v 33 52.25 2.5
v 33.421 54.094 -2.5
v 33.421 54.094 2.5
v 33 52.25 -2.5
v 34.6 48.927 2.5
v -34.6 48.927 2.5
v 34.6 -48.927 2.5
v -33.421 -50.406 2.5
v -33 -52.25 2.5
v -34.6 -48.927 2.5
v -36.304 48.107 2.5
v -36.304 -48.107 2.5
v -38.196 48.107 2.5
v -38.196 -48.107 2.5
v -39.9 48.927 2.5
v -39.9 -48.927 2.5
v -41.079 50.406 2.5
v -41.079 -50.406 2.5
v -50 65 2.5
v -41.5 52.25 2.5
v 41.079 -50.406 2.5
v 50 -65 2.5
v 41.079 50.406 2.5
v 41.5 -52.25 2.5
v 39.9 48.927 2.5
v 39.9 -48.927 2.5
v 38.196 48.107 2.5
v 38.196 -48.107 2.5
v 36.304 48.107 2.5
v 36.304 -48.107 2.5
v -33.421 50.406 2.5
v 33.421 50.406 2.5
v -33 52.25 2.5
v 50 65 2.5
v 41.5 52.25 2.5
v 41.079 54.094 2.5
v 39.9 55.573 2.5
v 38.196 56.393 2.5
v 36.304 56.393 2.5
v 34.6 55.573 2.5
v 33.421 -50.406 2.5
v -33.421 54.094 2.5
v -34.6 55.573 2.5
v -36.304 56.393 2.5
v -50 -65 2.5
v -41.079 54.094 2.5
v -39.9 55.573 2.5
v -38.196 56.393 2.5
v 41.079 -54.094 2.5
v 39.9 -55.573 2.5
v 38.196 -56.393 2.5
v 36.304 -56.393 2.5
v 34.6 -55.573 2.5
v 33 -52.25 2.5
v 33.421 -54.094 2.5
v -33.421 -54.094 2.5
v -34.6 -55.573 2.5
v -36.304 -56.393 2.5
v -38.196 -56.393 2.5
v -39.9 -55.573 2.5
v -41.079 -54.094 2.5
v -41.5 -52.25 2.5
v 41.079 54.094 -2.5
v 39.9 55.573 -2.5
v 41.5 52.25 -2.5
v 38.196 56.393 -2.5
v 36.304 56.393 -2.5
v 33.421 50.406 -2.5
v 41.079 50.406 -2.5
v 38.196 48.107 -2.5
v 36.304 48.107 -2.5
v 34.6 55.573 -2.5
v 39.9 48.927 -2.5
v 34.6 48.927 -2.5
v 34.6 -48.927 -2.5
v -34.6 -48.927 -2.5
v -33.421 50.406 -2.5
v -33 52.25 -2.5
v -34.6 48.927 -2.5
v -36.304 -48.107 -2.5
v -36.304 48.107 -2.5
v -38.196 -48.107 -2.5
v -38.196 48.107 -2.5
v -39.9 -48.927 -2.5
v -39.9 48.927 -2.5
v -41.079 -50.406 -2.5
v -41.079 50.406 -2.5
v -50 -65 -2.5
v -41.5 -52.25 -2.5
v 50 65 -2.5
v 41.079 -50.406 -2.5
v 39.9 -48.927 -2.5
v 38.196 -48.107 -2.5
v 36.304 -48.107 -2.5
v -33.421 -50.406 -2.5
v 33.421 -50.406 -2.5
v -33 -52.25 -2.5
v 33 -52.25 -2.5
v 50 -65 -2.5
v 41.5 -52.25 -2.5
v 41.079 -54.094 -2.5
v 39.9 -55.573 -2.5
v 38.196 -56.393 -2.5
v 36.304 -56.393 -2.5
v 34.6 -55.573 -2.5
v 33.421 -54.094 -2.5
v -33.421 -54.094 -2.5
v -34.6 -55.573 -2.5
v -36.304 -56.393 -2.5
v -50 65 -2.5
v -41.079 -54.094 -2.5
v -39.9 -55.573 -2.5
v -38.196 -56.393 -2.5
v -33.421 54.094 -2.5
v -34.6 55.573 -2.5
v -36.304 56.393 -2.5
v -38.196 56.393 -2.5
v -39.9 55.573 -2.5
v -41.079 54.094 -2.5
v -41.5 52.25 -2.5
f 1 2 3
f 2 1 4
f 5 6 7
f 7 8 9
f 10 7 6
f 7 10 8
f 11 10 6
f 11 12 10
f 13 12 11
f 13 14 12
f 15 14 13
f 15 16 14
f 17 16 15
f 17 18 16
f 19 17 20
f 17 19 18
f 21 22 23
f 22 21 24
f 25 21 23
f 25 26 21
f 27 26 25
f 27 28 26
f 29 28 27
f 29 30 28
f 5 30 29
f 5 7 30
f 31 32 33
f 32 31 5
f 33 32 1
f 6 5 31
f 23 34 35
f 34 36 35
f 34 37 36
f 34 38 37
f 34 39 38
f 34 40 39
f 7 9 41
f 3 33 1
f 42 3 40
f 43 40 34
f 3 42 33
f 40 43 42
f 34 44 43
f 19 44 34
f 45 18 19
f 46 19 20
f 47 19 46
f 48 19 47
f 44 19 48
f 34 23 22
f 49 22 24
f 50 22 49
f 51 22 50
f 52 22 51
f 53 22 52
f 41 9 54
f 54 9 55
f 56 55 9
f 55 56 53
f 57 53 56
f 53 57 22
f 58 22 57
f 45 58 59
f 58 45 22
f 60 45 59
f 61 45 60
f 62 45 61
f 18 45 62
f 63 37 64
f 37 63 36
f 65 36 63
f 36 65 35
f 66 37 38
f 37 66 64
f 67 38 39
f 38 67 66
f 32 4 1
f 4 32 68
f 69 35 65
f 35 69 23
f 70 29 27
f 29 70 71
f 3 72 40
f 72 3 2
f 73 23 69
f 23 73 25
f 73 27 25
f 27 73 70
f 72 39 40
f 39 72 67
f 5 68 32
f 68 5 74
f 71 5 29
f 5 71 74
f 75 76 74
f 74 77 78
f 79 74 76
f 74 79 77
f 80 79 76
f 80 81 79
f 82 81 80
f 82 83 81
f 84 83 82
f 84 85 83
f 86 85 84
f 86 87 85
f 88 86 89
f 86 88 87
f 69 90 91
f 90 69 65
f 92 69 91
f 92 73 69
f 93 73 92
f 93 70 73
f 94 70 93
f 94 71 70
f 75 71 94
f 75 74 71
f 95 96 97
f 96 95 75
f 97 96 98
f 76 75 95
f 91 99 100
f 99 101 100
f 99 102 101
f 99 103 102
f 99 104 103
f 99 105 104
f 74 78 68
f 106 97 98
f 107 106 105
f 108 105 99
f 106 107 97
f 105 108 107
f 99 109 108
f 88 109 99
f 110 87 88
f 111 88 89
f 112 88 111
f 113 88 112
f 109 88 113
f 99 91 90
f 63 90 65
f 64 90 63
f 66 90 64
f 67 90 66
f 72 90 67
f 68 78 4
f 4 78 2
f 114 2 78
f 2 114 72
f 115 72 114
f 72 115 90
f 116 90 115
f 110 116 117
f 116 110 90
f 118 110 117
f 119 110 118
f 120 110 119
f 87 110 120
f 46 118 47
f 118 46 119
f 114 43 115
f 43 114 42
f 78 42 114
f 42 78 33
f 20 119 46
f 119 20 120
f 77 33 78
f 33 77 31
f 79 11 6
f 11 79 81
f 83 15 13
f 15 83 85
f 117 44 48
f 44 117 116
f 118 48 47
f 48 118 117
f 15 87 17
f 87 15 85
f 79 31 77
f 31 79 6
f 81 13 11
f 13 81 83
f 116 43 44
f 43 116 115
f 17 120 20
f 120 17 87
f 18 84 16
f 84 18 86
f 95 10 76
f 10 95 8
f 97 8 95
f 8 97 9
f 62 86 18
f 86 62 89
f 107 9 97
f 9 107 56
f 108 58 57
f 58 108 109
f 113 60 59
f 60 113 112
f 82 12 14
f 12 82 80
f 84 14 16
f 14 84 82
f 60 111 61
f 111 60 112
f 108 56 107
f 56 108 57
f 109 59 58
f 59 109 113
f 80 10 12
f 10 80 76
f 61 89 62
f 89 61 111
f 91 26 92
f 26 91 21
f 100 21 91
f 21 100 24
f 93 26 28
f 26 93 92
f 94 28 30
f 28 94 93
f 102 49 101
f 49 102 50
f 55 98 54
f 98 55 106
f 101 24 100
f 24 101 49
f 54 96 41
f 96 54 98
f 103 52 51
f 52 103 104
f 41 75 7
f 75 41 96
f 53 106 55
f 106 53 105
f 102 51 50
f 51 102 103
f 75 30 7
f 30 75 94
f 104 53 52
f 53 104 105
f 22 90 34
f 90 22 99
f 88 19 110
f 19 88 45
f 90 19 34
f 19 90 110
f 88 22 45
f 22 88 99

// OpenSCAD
// Generated by SolidPython 1.1.3 on 2023-11-26 20:41:07


difference() {
	cube(center = true, size = [100, 130.0000000000, 5]);
	union() {
		translate(v = [37.2500000000, 52.2500000000]) {
			cylinder(center = true, h = 5, r = 4.2500000000);
		}
		translate(v = [-37.2500000000, 52.2500000000]) {
			cylinder(center = true, h = 5, r = 4.2500000000);
		}
		translate(v = [-37.2500000000, -52.2500000000]) {
			cylinder(center = true, h = 5, r = 4.2500000000);
		}
		translate(v = [37.2500000000, -52.2500000000]) {
			cylinder(center = true, h = 5, r = 4.2500000000);
		}
	}
}
/***********************************************
*********      SolidPython code:      **********
************************************************
 
import solid
import numbers
import pudb
from solid.utils import *
import viewscad
import subprocess
import os
import os.path as osp
import math
import sys

chamfer_extrude=solid.import_scad("./chamfer_extrude.scad")
chamfer_extrude=chamfer_extrude.chamfer_extrude
r = viewscad.Renderer(width=800, height=800)

def debug(model,f_name,path="/home/ts/code/projects/mfd/designs/debug"):
    solid.scad_render_to_file(model,osp.join(path,f_name)+".scad")
#generate position list of wells using offset from center
wells_pos_from_center_4 = lambda offset: [[-offset,offset],
                                        [offset, offset],
                                        [-offset, -offset],
                                        [offset, -offset]]
#wells_pos_from_center_2 = lambda offset: [[0,offset],
#                                        [0, -offset]]
wells_pos_from_center_2 = lambda offset: [[offset,0],
                                        [-offset,0]]

def make_well(dims,shape=None,height=None,dxf=False):
    def circle_cylinder():
        if dxf or (height is None):
            well = solid.circle(r=dims, segments=64)
        else:
            well = solid.cylinder(r=dims, h=height, segments=64, center = True)
        return well
    if dims is None:
        sys.exit("radius needs to be a number")
    if isinstance(dims, numbers.Number):
        well =circle_cylinder()
    elif len(dims)==1:
        if isinstance(dims[1], numbers.Number):
            well =circle_cylinder()
        else:
            sys.exit("radius needs to be a number")
    elif len(dims)==2:
        well = solid.square(dims,center = True)
    elif len(dims)==3:
        well = solid.cube(dims, center = True)
    return well

def wells_top_bottom(center_gap,device_dims=None,shape=None,height=None, positions = None, dxf = False,well_shape=None):
    if well_shape == None:
        well_shape = make_well(device_dims,shape=shape,height=height,dxf=dxf)
    wells = []
    if positions is None:
        offset = radius+radius/2.0
        positions = wells_pos_from_center_2(offset)
    if dxf or (height is None):
        height = 0
    for position in positions:
        if dxf:
            wells.append(solid.translate([position[0],position[1]])(well_shape))
        else:
            wells.append(solid.translate([position[0],position[1],height/2.0])(well_shape))
    return  union()(*wells)

#place wells in four corners 
def four_corner(radius,height=None, positions = None, dxf = False):
    #if well pos not specified set
    #to equally spaced by half radius
    if positions is None:
        offset = radius+radius/2.0
        positions = wells_pos_from_center_4(offset)
    if dxf or (height is None):
        height = 0
    #make wells at positions with specified radius and height
    wells = []
    for position in positions:
        #make circle if making dxf
        if dxf:
            well_shape = solid.circle(r=radius, segments=64)
            well_shape = solid.translate([position[0],position[1]])(well_shape)
        #if stl make cylinder
        else:
            well_shape = solid.cylinder(r=radius, h=height, segments=64, center = True)
            well_shape = solid.translate([position[0],position[1],height/2.0])(well_shape)
        wells.append(well_shape)
    return  union()(*wells)

#generate channels 
def make_channels(length,width,height=0,num_chans=1,max_chans=None,spacing=None, dxf = False,
                  rotate_channels=False):
    if dxf or (height is None):
        height = 0
    #if channel gap not defined, is equal to
    if spacing is None: spacing = width
    #calculate number of channels if fitting max num within given width
    if not max_chans is None:
        import math
        num_chans = math.floor((max_chans-spacing)/(width+spacing))
    #get total width of channel section  
    total_width = (width*num_chans)+(spacing*(num_chans-1))

    #make template channel
    #if rotate_channels: width, length = length, width
    if dxf:
        channel_t = solid.square([length,width],center = True)
    else:
        channel_t = solid.cube([length,width,height], center = True)

    #if number channels is even, offset the first channel to center its gap
    if num_chans % 2 == 0: centering = -(width/2.0+spacing/2.0)
    else: centering = 0
    #move template channel up to align bottom at z = 0 
    #and offset center if necessary
    if dxf:
        channel_t = solid.translate([0,centering])(channel_t)
    else:
        channel_t = solid.translate([0,centering,height/2.0])(channel_t)

    #if rotate_channels: length,width = width,length
    #start making the channels
    channels = []
    for i in range(num_chans):
        #if i=0 there is no translation
        #if i=1, we make the first channel adjacent to second
        direction = i

        #if i>=1, we add channels alternating left and right
        if i >= 1:
            direction = -(i/2.0)
            if i % 2 == 1: direction = (-direction)+0.5
                
        #make channel at right position and add it to channel list
        translation_coords = [0,direction*(width+spacing)]
        #if rotate_channels: translation_coords = [direction*(width+spacing),0]
        if dxf:
            channel = solid.translate(translation_coords)(channel_t)
        else:
            channel = solid.translate([*translation_coords,0])(channel_t)
        channels.append(channel)
    
    #group all channels as one object
    channels = union()(*channels)
    #compute the x,y,z dimensions in order to pass as arguments 
    #for construction of other parts of device (such as the chambers)
    measurements = {'x':(length/2.0,-length/2.0),
                    'y':(total_width/2.0,-total_width/2.0)}
    if not dxf:
        measurements['z'] = (height,0)
    if rotate_channels:
        channels = solid.rotate(90)(channels)
        measurements['x'],measurements['y']=measurements['y'],measurements['x']
    return channels,measurements

def make_chambers(msrs,height=None,extra=0,len_until=None,width=None, dxf = False):
    #computes x,y,z length
    total = lambda x : abs(x[0]) + abs(x[1])
    
    #if specific height if specified
    #otherwise use same height as channels
    if dxf:
        pass
    elif not height is None:
        msrs['z'] = (height,0)
    else:
        msrs['z'] = (0,0)
        
    #make copy of measurements from channels to modify chamber dimensions 
    #and add length to chambers as specified
    chamber_dims = msrs.copy()
    #calculate length of chamber to reach specified offset
    if not len_until is None:
        chamber_len = len_until-(msrs['x'][0])
    #or add specified length to channel length (if not specified, adds 0)
    else:
        chamber_len = msrs['x'][0]+extra
    #set the chamber length based 
    chamber_dims['x'] = (chamber_len/2.0,-(chamber_len/2.0))
    #compute final dimensions of chamber
    if not width is None:
        chamber_dims['y'] = (width/2.0,-width/2.0)
    chamber_dims = [total(size) for size in chamber_dims.values()]
        
    #calculate chamber translation offset to place adjacent to channels
    chamber_trslt = msrs['x'][0]+(chamber_len/2.0)
    #compute chamber translation coordinates to align with channels
    #x = 1 moves chamber above channels
    #x = -1 moves chamber below channels
    if dxf:
        trslt = lambda x : [x*(chamber_trslt),0]
    else:
        trslt = lambda x : [x*(chamber_trslt),0,msrs['z'][0]/2.0]
    
    #function to make chamber at top or at bottom 
    if dxf:
        move = lambda x : solid.translate(trslt(x))(solid.square(chamber_dims, center = True) )
    else:
        move = lambda x : solid.translate(trslt(x))(solid.cube(chamber_dims,center = True))
    #make top and bottom chambers and return them as grouped
    top = move(1)
    bottom = move(-1)
    #chambers=solid.rotate(90)(solid.union()(top,bottom))
    chambers=(solid.union()(top,bottom))

    return chambers

#create alignment features 
def alignment_features(unit,dims,grid_size, mask_size = None, alignment = "hollow", units_from_center = (2.5,2.5), corner_len=None):
    width = grid_size[0]*dims[0]
    length = grid_size[1]*dims[1]
    if mask_size is None and corner_len is None:
        corner_len = (dims[0] + dims[1]) /2 / 8
    corner = lambda thickness_div : solid.union()( solid.square([corner_len,corner_len/thickness_div],center=False), solid.square([corner_len/thickness_div,corner_len],center=False) )
    
    def make_full(thickness_div):
        thickness = corner_len/thickness_div
        tr = solid.translate([0, 0, 0 ])(solid.rotate(180)(corner(thickness_div)))
        tr = solid.translate([thickness/2,thickness/2,0])(tr)
        bl = solid.translate([0, 0, 0 ])(solid.rotate(0)(corner(thickness_div)))
        bl = solid.translate([-thickness/2,-thickness/2,0])(bl)
        return solid.union()(tr,bl)
    
    def make_hollow(thickness_div):
        thickness = corner_len/(thickness_div/2)
        inner = make_full(thickness_div)
        outer = make_full(thickness_div/2)
        hollow = outer - inner 
        return hollow
    
    center = (width /2 , length/2)
    mask_pos = lambda x,y : (center[0] + x*(float(units_from_center[0])*dims[0]), center[1] + y*(float(units_from_center[1])*dims[1]))
    positions = []
    positions.append(mask_pos(1,0))
    positions.append(mask_pos(0,1))
    positions.append(mask_pos(-1,0))
    positions.append(mask_pos(0,-1))
    make_mask = lambda mtype : make_hollow(8) if mtype == "hollow" else make_full(8)
    masks = [ solid.translate([*position,0])(make_mask(alignment)) for position in positions]
    
    solid.scad_render_to_file(solid.union()(*masks),"./designs/open_chamber/masks.scad")
    #return unit - solid.union()(*masks)
    return solid.union()(*masks,unit)

def create_outline(thickness, array, dims, grid_size,):
    width = grid_size[0]*dims[0] + thickness *2
    length = grid_size[1]*dims[1] + thickness *2
    outer = solid.translate([-thickness, -thickness,0])(solid.square([width, length]))
    return outer-array

def create_wall(wall_thickness, outline_thickness, dims, grid_size, wall_height = 2000, dxf = False):
    inner_width = grid_size[0]*dims[0] + outline_thickness *2
    inner_length = grid_size[1]*dims[1] + outline_thickness *2
    outer_width = inner_width + wall_thickness * 2
    outer_length = inner_length + wall_thickness * 2
    outer_pos_x = -outline_thickness-wall_thickness
    outer_pos_y = -outline_thickness-wall_thickness
    inner_pos_x = -outline_thickness
    inner_pos_y = -outline_thickness
    if dxf:
        inner_wall = solid.translate([inner_pos_x,
                                      inner_pos_y,
                                      0])(solid.square([inner_width, inner_length]))
        outer_wall = solid.translate([outer_pos_x,
                                      outer_pos_y,
                                      0])(solid.square([outer_width, outer_length]))

        return outer_wall-inner_wall
    else:
        inner_wall = solid.translate([inner_pos_x,
                                      inner_pos_y,
                                      0])(solid.cube([inner_width, inner_length,wall_height]))
        outer_wall = solid.translate([outer_pos_x,
                                      outer_pos_y,
                                      0])(solid.cube([outer_width, outer_length,wall_height]))

        return outer_wall-inner_wall, {'wall_height': wall_height,
                                       'wall_thickness': wall_thickness,
                                       'inner_width':inner_width,
                                       'inner_length': inner_length,
                                       'outer_width': outer_width,
                                       'outer_length': outer_length,
                                       'outer_pos_x' : outer_pos_x,
                                       'outer_pos_y' : outer_pos_y,
                                       'inner_pos_x' : inner_pos_x,
                                       'inner_pos_y' : inner_pos_y}

def create_thicker_wall(wall_thickness, outer_wall_offset, wall_dims, dims, grid_size, height_start = .2, height_end=2, dxf = False):
    addon_wall,thicker_wall_dims = create_wall(wall_thickness, outer_wall_offset, dims, grid_size, wall_height=height_end-height_start, dxf = False)
    addon_wall = solid.translate([0,0,height_start])(addon_wall)

    thicker_wall_dims['wall_height'] = height_end
    thicker_wall_dims['wall_thickness'] = wall_dims['wall_thickness'] + wall_thickness
    return addon_wall, thicker_wall_dims
 
def add_lock_to_wall(wall,wall_dims,y_offset = 0,cut_ratio=0.7,L_length=3, gap_ratio=0.05, axis="x",width_ratio=1/2):
    # Makes L shape
    def make_L(max_length,length_thickness,max_width,width_thickness,height,y_offset):
        length = solid.cube([max_length,length_thickness,height])
        width = solid.cube([width_thickness,max_width,height])
        width = solid.translate([max_length-(width_thickness),0,0])(width)
        L = solid.union()(width,length)
        debug(L,"L")
        if axis == "x":
            L = solid.rotate(-90)(L)
            L = solid.translate([0,max_length,0])(L)
        else:
            L = solid.rotate(-180)(L)
            L = solid.translate([max_length,max_width,0])(L)
        return solid.translate([0,0,y_offset])(L)
    
    lock_length = L_length
    lock_width = wall_dims['wall_thickness']*width_ratio
    lock_length_thickness = lock_width/2
    lock_width_thickness = lock_width/2
    L_lock = make_L(lock_length,lock_length_thickness,lock_width,lock_width_thickness, wall_dims['wall_height']-y_offset, y_offset)
    
    margin_space = lock_length - lock_length*(1-gap_ratio)
    key_length = lock_length-margin_space
    key_length_thickness = lock_length_thickness-(margin_space*2)
    key_width = lock_width-(margin_space*2)
    key_width_thickness = lock_width_thickness-(margin_space*2)
    L_key = make_L(key_length,key_length_thickness,key_width,key_width_thickness, wall_dims['wall_height']-y_offset, y_offset)
    L_key = solid.translate([margin_space,margin_space,0])(L_key)
    L = solid.union()(L_lock,L_key)
    debug(L,"L")
    
    #Make cube to be used as negative to split frame in a half
    #Can choose if making left or right negative, specify ratio of split
    def make_negative(right,cut_ratio):
        if axis == "x":
            if right:
                length = wall_dims['outer_length']*(1-cut_ratio)
                pos_x = wall_dims['outer_pos_x']+(wall_dims['outer_length']*cut_ratio)
            else:
                length = wall_dims['outer_length']*(cut_ratio)
                pos_x = wall_dims['outer_pos_x'] 
            negative = solid.cube([wall_dims['outer_width'],length, wall_dims['wall_height']])
            negative = solid.translate([wall_dims['outer_pos_y'],pos_x,0])(negative)
        else:
            if right:
                length = wall_dims['outer_width']*(1-cut_ratio)
                pos_x = wall_dims['outer_pos_y']+(wall_dims['outer_width']*cut_ratio)
            else:
                length = wall_dims['outer_width']*(cut_ratio)
                pos_x = wall_dims['outer_pos_y'] 
            negative = solid.cube([length,wall_dims['outer_length'], wall_dims['wall_height']])
            negative = solid.translate([pos_x,wall_dims['outer_pos_x'],0])(negative)
        return negative, pos_x, length 
                      
    #Make negatives
    negative_right, right_half_pos_x, right_half_length = make_negative(True,cut_ratio)
    negative_left, left_half_pos_x, right_half_length = make_negative(False,cut_ratio)
    #Make halves
    left_half = solid.difference()(wall,negative_right)
    right_half = solid.difference()(wall,negative_left)
    def place_L(L, L_length,L_width):
        #Place L on top wall       
        offset_to_center = (wall_dims['wall_thickness']-L_width)/2
        if axis == "x":
            y_pos_top = (wall_dims['outer_pos_y'] +
                    wall_dims['outer_width'] - 
                    L_width - offset_to_center)
            top_L = solid.translate([y_pos_top,
                                     right_half_pos_x-(L_length),
                                     0])(L)
            #Place L on bottom wall       
            y_pos_bottom = wall_dims['outer_pos_y']+offset_to_center
            bottom_L = solid.translate([y_pos_bottom,
                                        right_half_pos_x-L_length,
                                        0])(L)
        else:
            y_pos_top = (wall_dims['outer_pos_x'] +
                    wall_dims['outer_length'] -
                    (L_width+offset_to_center))
            top_L = solid.translate([right_half_pos_x-L_length,
                                     y_pos_top,
                                     0])(L)
            #Place L on bottom wall       
            y_pos_bottom = wall_dims['outer_pos_y']+offset_to_center
            bottom_L = solid.translate([right_half_pos_x-L_length,
                                        y_pos_bottom,
                                        0])(L)
        return bottom_L, top_L
    #Make complimentary L pieces through union and differences
    #Make Lock
    bottom_L_lock, top_L_lock = place_L(L_lock,L_length,lock_width)
    left_half = solid.difference()(left_half,bottom_L_lock)
    left_half = solid.difference()(left_half,top_L_lock)
    #Make Key
    bottom_L_key, top_L_key = place_L(L_key,L_length,lock_width)
    right_half = solid.union()(right_half,bottom_L_key)
    right_half = solid.union()(right_half,top_L_key)
    return left_half, right_half


#build a row x col grid of containment units
def make_unit_array(unit,dims,grid_size, dxf = False, alignment = None, mask_size = None,
                    units_from_center = None,alignment_offset=None, alignment_mark_size=1):
    units = []
    for col in range(grid_size[1]):
        for row in range(grid_size[0]):
            if dxf:
                units.append(solid.translate([row*dims[0],col*dims[1]])(unit))
            else:
                units.append(solid.translate([row*dims[0],col*dims[1],dims[2]/2.0])(unit))
    array = solid.union()(*units)
    if (not alignment is None) and dxf:
        if not alignment_offset is None:
            array = solid.translate([alignment_offset[0],alignment_offset[1]])(array)
        array = alignment_features(array,dims, grid_size, alignment = alignment, mask_size = None, units_from_center = units_from_center,corner_len=alignment_mark_size)
        if not alignment_offset is None:
            array = solid.translate([-alignment_offset[0],-alignment_offset[1]])(array)
    return array


def make_taylor(wells_pos = wells_pos_from_center_4(2.25), well_rad = 1.5 ,
                well_height = 2, chan_w = 0.01, chan_l = 1, chan_h = 0.010 ,
                chan_gap = 0.040, max_chans = None,num_chans=100, chamber_height  = 0.100,
                columns = 1, rows = 1, chamber_len_until=2.25, add_channels = True, add_wells = True, 
                add_chambers = True, save_path = "./", alignment = None, units_from_center = 2,
                mask_size = None, render_stl = False, outline_thickness = 0.050, dxf = True,
                wall_height = 15, wall_thickness = 0.95, casing_x=9, casing_y=9, casing_z=0,rotate_units=0):

    dims = [casing_x, casing_y, casing_z]
    wells = four_corner(well_rad,well_height, dxf = dxf, positions = wells_pos)
    debug(wells,"wells")
    channels, msrs = make_channels(chan_l,chan_w,chan_h,dxf=dxf, spacing = chan_gap, max_chans=max_chans,num_chans=num_chans)
    debug(channels,"channels")
    chambers = make_chambers(msrs,dxf = dxf, height=chamber_height,len_until=chamber_len_until)
    debug(chambers,"chambers")

    #add together and render
    device_parts = []
    if add_channels:
        device_parts.append(channels)
    if add_wells:
        device_parts.append(wells)
    if add_chambers:
        device_parts.append(chambers)
    device=union()(*device_parts)
    device = rotate(rotate_units)(device)

    device=solid.translate([dims[0]/2.0,dims[1]/2.0,0])(device)
    channels = rotate(rotate_units)(channels)
    channels=solid.translate([dims[0]/2,dims[1]/2,0])(channels)
    chambers_wells = union()(wells,chambers)
    chambers_wells = rotate(rotate_units)(chambers_wells)
    chambers_wells=solid.translate([dims[0]/2,dims[1]/2,0])(chambers_wells)

    file_name = str(rows)+'x'+str(columns)+'_units_'
    grid_size = [rows,columns]

    if alignment:
        alignment="full"
    device = make_unit_array(device,dims,grid_size, dxf=dxf, alignment = alignment,
                                 units_from_center = units_from_center)
    channels = make_unit_array(channels,dims,grid_size, dxf=dxf, alignment = alignment,
                                 units_from_center = units_from_center)
    if alignment=="full":
        alignment="hollow"

    chambers_wells = make_unit_array(chambers_wells,dims,grid_size, dxf=dxf, alignment = alignment,
                                 units_from_center =units_from_center)

    def save_model(model,prefix):
        model_fname = os.path.abspath(save_path+prefix+"_"+file_name+".scad")
        solid.scad_render_to_file(model,model_fname)
        return model_fname

    wells_fname = save_model(wells,"wells")
    channels_fname = save_model(channels,"channels")
    device_fname = save_model(device,"device")
    chambers_wells_fname = save_model(chambers_wells,"chambers_wells")
    return (chambers_wells,chambers_wells_fname), (channels,channels_fname), (device,device_fname)

def make_device(design='open',rows=8,columns=6,wells_pos = 4.5,well_offset=3.2, well_rad=3.2,well_height=0.1,
                chan_l=1,chan_w=0.01,chan_h=0.01,chan_gap=0.015,num_chans=101,dxf=True,save_path="./designs/open_chamber/",
                casing_x=9.0,casing_y=18.0,casing_z=0,rotate_units=90,units_from_center=(3,1),chamber_len_until=4.5,
                chamber_width=None,alignment=True, add_wells=True, add_channels=True,add_chambers=True,well_shape=None):

    dims = [casing_x, casing_y, casing_z]
    if design == "open":
        wells_pos=wells_pos_from_center_2(wells_pos)
        wells = wells_top_bottom(well_offset*2,device_dims=well_rad,height=well_height, dxf = dxf, positions = wells_pos,well_shape=well_shape)
    elif design == "closed":
        wells_pos=wells_pos_from_center_4(wells_pos)
        debug(wells,"wells")
        wells = four_corner(well_offset,well_height,device_dims=well_rad, dxf = dxf, positions = wells_pos)
    else:
        print(design+" is not a valid design.\n Choose valid design: 'open' or 'closed'")
        exit()
    wells = rotate(rotate_units)(wells)
    wells=solid.translate([dims[0]/2,dims[1]/2,0])(wells)
    debug(wells,"wells")

    channels, msrs = make_channels(chan_l,chan_w,chan_h,dxf=dxf, spacing = chan_gap, num_chans=num_chans,rotate_channels=False)
    channels = rotate(rotate_units)(channels)
    channels=solid.translate([dims[0]/2,dims[1]/2,0])(channels)

    chambers=make_chambers(msrs,height=None,extra=0,len_until=chamber_len_until, width=chamber_width,dxf = dxf)
    chambers = rotate(rotate_units)(chambers)
    chambers=solid.translate([dims[0]/2,dims[1]/2,0])(chambers)

    device_parts = []
    if add_channels:
        device_parts.append(channels)
    if add_wells:
        device_parts.append(wells)
    if add_chambers:
        device_parts.append(chambers)
    device = union()(*device_parts)
    #device = rotate(rotate_units)(device)
    #device=solid.translate([dims[0]/2.0,dims[1]/2.0,0])(device)

    chambers_wells = []
    if add_chambers:
        chambers_wells.append(chambers)
    if add_wells:
        chambers_wells.append(wells)
    chambers_wells = union()(*chambers_wells)
    #chambers_wells = union()(wells,chambers)
    #chambers_wells = rotate(rotate_units)(chambers_wells)
    #chambers_wells=solid.translate([dims[0]/2,dims[1]/2,0])(chambers_wells)

    file_name = str(rows)+'x'+str(columns)+'_units_'

    grid_size = [rows,columns]
    if alignment:
        alignment="full"
    device = make_unit_array(device,dims,grid_size, dxf=dxf, alignment = alignment,
                                 units_from_center = units_from_center)
    channels = make_unit_array(channels,dims,grid_size, dxf=dxf, alignment = alignment,
                                 units_from_center = units_from_center)
    if alignment=="full":
        alignment="hollow"

    chambers_wells = make_unit_array(chambers_wells,dims,grid_size, dxf=dxf, alignment = alignment,
                                 units_from_center =units_from_center)

    def save_model(model,prefix):
        model_fname = os.path.abspath(save_path+prefix+"_"+file_name+".scad")
        solid.scad_render_to_file(model,model_fname)
        return model_fname

    wells_fname = save_model(wells,"wells")
    channels_fname = save_model(channels,"channels")
    device_fname = save_model(device,"device")
    chambers_wells_fname = save_model(chambers_wells,"chambers_wells")
    return (chambers_wells,chambers_wells_fname), (channels,channels_fname), (device,device_fname)


def make_open_chamber(rows=8,columns=6,wells_pos = wells_pos_from_center_2(4.5), well_rad=3.2,well_height=0.1,
                      chan_l=1,chan_w=0.01,chan_h=0.01,chan_gap=0.015,num_chans=101,dxf=True,save_path="./designs/open_chamber/",
                      casing_x=9.0,casing_y=18.0,casing_z=0,rotate_units=90,units_from_center=(3,1),chamber_len_until=4.5,
                      chamber_width=None,alignment=True, add_wells=True, add_channels=True,add_chambers=True,well_shape=None):

    dims = [casing_x, casing_y, casing_z]
    wells = wells_top_bottom(well_rad,height=well_height, dxf = dxf, positions = wells_pos, well_shape=well_shape)
    channels, msrs = make_channels(chan_l,chan_w,chan_h,dxf=dxf, spacing = chan_gap, num_chans=num_chans,rotate_channels=False)
    chambers=make_chambers(msrs,height=None,extra=0,len_until=chamber_len_until, width=chamber_width,dxf = dxf)
    debug(chambers,"chambers")
    device_parts = []
    if add_channels:
        device_parts.append(channels)
    if add_wells:
        device_parts.append(wells)
    if add_chambers:
        device_parts.append(chambers)
    device = union()(*device_parts)
    device = rotate(rotate_units)(device)
    device=solid.translate([dims[0]/2.0,dims[1]/2.0,0])(device)
    channels = rotate(rotate_units)(channels)
    channels=solid.translate([dims[0]/2,dims[1]/2,0])(channels)
    chambers_wells = union()(wells,chambers)
    chambers_wells = rotate(rotate_units)(chambers_wells)
    chambers_wells=solid.translate([dims[0]/2,dims[1]/2,0])(chambers_wells)

    file_name = str(rows)+'x'+str(columns)+'_units_'

    grid_size = [rows,columns]
    if alignment:
        alignment="full"
    device = make_unit_array(device,dims,grid_size, dxf=dxf, alignment = alignment,
                                 units_from_center = units_from_center)
    channels = make_unit_array(channels,dims,grid_size, dxf=dxf, alignment = alignment,
                                 units_from_center = units_from_center)
    if alignment=="full":
        alignment="hollow"

    chambers_wells = make_unit_array(chambers_wells,dims,grid_size, dxf=dxf, alignment = alignment,
                                 units_from_center =units_from_center)

    def save_model(model,prefix):
        model_fname = os.path.abspath(save_path+prefix+"_"+file_name+".scad")
        solid.scad_render_to_file(model,model_fname)
        return model_fname

    wells_fname = save_model(wells,"wells")
    channels_fname = save_model(channels,"channels")
    device_fname = save_model(device,"device")
    chambers_wells_fname = save_model(chambers_wells,"chambers_wells")
    return (chambers_wells,chambers_wells_fname), (channels,channels_fname), (device,device_fname)

def to_dxf(scad_path):
    dxf_path = scad_path.replace(".scad",".dxf")
    subprocess.call(["openscad", "-o", dxf_path, scad_path])
    import ezdxf
    temp_dxf = ezdxf.readfile(dxf_path)
    temp_dxf.saveas(dxf_path)

#def make_walls(diameter,thickness,grid_size,dims,height=20,segments=256,make_inner=True):
#    wafer_wall_out = solid.cylinder(r=diameter/2,h=height, segments=segments)
#    wafer_wall_in = solid.cylinder(r=(diameter/2-thickness),h=height, segments=segments)
#    wafer_wall = solid.difference()(wafer_wall_out,wafer_wall_in)
#    wafer_wall = solid.translate([grid_size[1]*dims[1]/2.0,grid_size[0]*dims[0]/2.0])(wafer_wall)
#
#    vertical_wall_length = grid_size[1]*dims[1]
#    horizontal_wall_length = grid_size[0]*dims[0]
#    vertical_wall = solid.cube([vertical_wall_length,thickness,height],center = True)
#    vertical_wall = solid.translate([vertical_wall_length/2,0,height/2])(vertical_wall)
#    horizontal_wall = solid.cube([thickness,horizontal_wall_length,height],center = True)
#    horizontal_wall = solid.translate([0,vertical_wall_length/2,height/2])(horizontal_wall)
#    walls = []
#    walls.append(horizontal_wall)
#    walls.append(vertical_wall)
#    for col in range(grid_size[1]):
#        if col == grid_size[1]-1: 
#            walls.append(solid.translate([0,(col+1)*dims[1]])(vertical_wall))
#        elif col > 0 and col < grid_size[1]-1 and make_inner==True:
#            walls.append(solid.translate([0,(col+1)*dims[1]])(vertical_wall))
#    for row in range(grid_size[0]):
#        if row == grid_size[0]-1: 
#            walls.append(solid.translate([(row+1)*dims[0],0])(horizontal_wall))
#        elif row > 0 and row < grid_size[0]-1 and make_inner==True:
#            walls.append(solid.translate([(row+1)*dims[0],0])(horizontal_wall))
#    walls = union()(*walls)
#    wafer_walls = union()(walls,wafer_wall)
#    return walls,wafer_wall,wafer_walls

def make_walls(diameter,thickness,grid_size,dims,height=20,segments=256,make_inner=True,padx=0,pady=0):
    wafer_wall_out = solid.cylinder(r=diameter/2,h=height, segments=segments)
    wafer_wall_in = solid.cylinder(r=(diameter/2-thickness),h=height, segments=segments)
    wafer_wall = solid.difference()(wafer_wall_out,wafer_wall_in)
    wafer_wall = solid.translate([grid_size[1]*dims[1]/2.0,grid_size[0]*dims[0]/2.0])(wafer_wall)

    vertical_wall_length = grid_size[0]*dims[0]+padx
    horizontal_wall_length = grid_size[1]*dims[1]+pady
    vertical_wall = solid.cube([vertical_wall_length,thickness,height],center = True)
    vertical_wall = solid.translate([vertical_wall_length/2-pady/2,-padx/2,height/2])(vertical_wall)
    horizontal_wall = solid.cube([thickness,horizontal_wall_length,height],center = True)
    horizontal_wall = solid.translate([-pady/2,horizontal_wall_length/2-padx/2,height/2])(horizontal_wall)
    walls = []
    walls.append(horizontal_wall)
    walls.append(vertical_wall)
    for col in range(grid_size[1]):
        if col == grid_size[1]-1: 
            walls.append(solid.translate([0,(col+1)*dims[1]+pady])(vertical_wall))
        elif col > 0 and col < grid_size[1]-1 and make_inner==True:
            walls.append(solid.translate([0,(col+1)*dims[1]])(vertical_wall))
    for row in range(grid_size[0]):
        if row == grid_size[0]-1: 
            walls.append(solid.translate([(row+1)*dims[0]+padx,0])(horizontal_wall))
        elif row > 0 and row < grid_size[0]-1 and make_inner==True:
            walls.append(solid.translate([(row+1)*dims[0],0])(horizontal_wall))
    walls = union()(*walls)
    wafer_walls = union()(walls,wafer_wall)
    return walls,wafer_wall,wafer_walls

def save_model(model,base_path,base_name,dxf=True):
    if not os.path.exists(base_path):
        os.makedirs(base_path)
    dxf_path=osp.join(base_path,base_name+".scad")
    solid.scad_render_to_file(model,osp.join(dxf_path))
    if dxf:
        to_dxf(dxf_path)

def make_wafer(diameter,flat_len,thickness):
    wafer = solid.cylinder(r1=diameter/2,r2=diameter/2,h=thickness,segments=512,)()
    x_start_flat=(flat_len/2)
    y_start_flat = math.sqrt(((diameter/2)**2) - (x_start_flat**2) )
    height_delete_flat=diameter/2-y_start_flat
    flat_delete = solid.cube([flat_len,height_delete_flat,thickness],center=False)()
    flat_delete = solid.translate([-flat_len/2,y_start_flat,0])(flat_delete)
    wafer = solid.difference()(wafer,flat_delete)
    wafer = solid.rotate(90)(wafer)
    return wafer

def add_wafer_to_mask(wafer_size,flat_len,mask,grid_size,dims,wafer_line_thickness=0.1,outer_mask_thickness=5,alignment_offset=None):
    def make_wafer_mask(wafer_size,flat_len):
        wafer_mask = make_wafer(wafer_size,flat_len,1)
        wafer_mask = solid.projection()(wafer_mask)
        wafer_mask = solid.translate([grid_size[0]*dims[0]/2.0,grid_size[1]*dims[1]/2.0])(wafer_mask)
        if not alignment_offset is None:
            wafer_mask = solid.translate([-alignment_offset[0],-alignment_offset[1]])(wafer_mask)
        return wafer_mask

    inner_wafer_line_mask = make_wafer_mask(wafer_size-wafer_line_thickness/2,flat_len)
    outer_wafer_line_mask = make_wafer_mask(wafer_size+wafer_line_thickness/2,flat_len)
    outer_wafer_mask = make_wafer_mask(wafer_size+outer_mask_thickness,flat_len)
    outer_wafer_mask = solid.difference()(outer_wafer_mask,outer_wafer_line_mask)
    wafer_mask = solid.union()(outer_wafer_mask,inner_wafer_line_mask)

    return solid.difference()(wafer_mask,mask)

def make_posts(post_shape,post_height):
    posts = solid.linear_extrude(height=post_height)(post_shape)
    return posts

def make_wafer_empty(diameter,flat_len,thickness,margin,notch_len=20,notch_height=5,oversize=1.01):
    diameter*=oversize
    flat_len*=oversize
    wafer = make_wafer(diameter,flat_len,thickness)
    holder = solid.cylinder(r1=diameter/2+margin,r2=diameter/2+margin,h=thickness,segments=512)()
    holder = solid.difference()(holder,wafer)

    x_start_flat=(flat_len/2)
    y_start_flat = math.sqrt(((diameter/2)**2) - (x_start_flat**2) )
    height_delete_flat=diameter/2-y_start_flat
    notch = solid.cube([notch_len,notch_height,thickness],center=False)()
    notch = solid.translate([-notch_len/2,y_start_flat,0])(notch)
    notch = solid.rotate(90)(notch)
    return solid.difference()(holder,notch)

def wafer_print_calibration(diameter,thickness,height,z_offset):
    circles = []
    radii = []
    radii.append(diameter/2.0*0.8)
    radii.append(diameter/2.0*0.6)
    radii.append(diameter/2.0*0.4)
    radii.append(diameter/2.0*0.2)
    for radius in radii:
        inner = solid.cylinder(r1=radius-(thickness/2.0),r2=radius-(thickness/2.0),h=thickness,segments=512,)()
        outer = solid.cylinder(r1=radius+(thickness/2.0),r2=radius+(thickness/2.0),h=thickness,segments=512,)()
        diff = solid.difference()(outer,inner)
        circles.append(diff)
    circles = solid.union()(*circles)
    circles = solid.translate([0,0,z_offset])(circles)
    return circles

def make_rack(wells,dims,grid_size,alignment_offset,rack_x,rack_y,rack_thickness,bolt_width,add_bolts=True):

    #get X and Y dimensions of gride of pipette tips
    X_len = dims[0]*grid_size[0]
    Y_len = dims[1]*grid_size[1]
    #make rack
    rack = solid.cube([rack_x,rack_y,rack_thickness],center=True)

    if add_bolts:
    #add bolt holes
        bolt_hole=solid.cylinder(r=bolt_width/2,h=rack_thickness,center=True)()
        bolt_holes = []
        bolt_holes.append(solid.translate([rack_x/2-1.5*bolt_width,rack_y/2-1.5*bolt_width])(bolt_hole))
        bolt_holes.append(solid.translate([-rack_x/2+1.5*bolt_width,rack_y/2-1.5*bolt_width])(bolt_hole))
        bolt_holes.append(solid.translate([-rack_x/2+1.5*bolt_width,-rack_y/2+1.5*bolt_width])(bolt_hole))
        bolt_holes.append(solid.translate([rack_x/2-1.5*bolt_width,-rack_y/2+1.5*bolt_width])(bolt_hole))
        bolt_holes = solid.union()(*bolt_holes)
        rack=solid.difference()(rack,bolt_holes)
    rack_support = rack

    #center rack with pipette holes
    rack = solid.translate([0,0,rack_thickness/2])(rack)
    rack = solid.translate([X_len/2,Y_len/2])(rack)
    rack = solid.translate([-alignment_offset[0],-alignment_offset[1]])(rack)
    wells = solid.linear_extrude(height=rack_thickness)(wells)
    rack = solid.difference()(rack,wells)
    return rack, rack_support

def make_pillar(wells,dims,grid_size,alignment_offset,rack_x,rack_y,pillar_height,rack_thickness,bolt_width,add_bolts=True,taper_angle=1,bolt_position_corner=1.5):

    #get X and Y dimensions of gride of pipette tips
    X_len = dims[0]*grid_size[0]
    Y_len = dims[1]*grid_size[1]
    #make rack
    rack = solid.cube([rack_x,rack_y,rack_thickness],center=True)
    
    if add_bolts:
    #add bolt holes
        bolt_hole=solid.cylinder(r=bolt_width/2,h=rack_thickness,center=True)()
        bolt_holes = []
        bolt_holes.append(solid.translate([rack_x/2-bolt_position_corner*bolt_width,rack_y/2-bolt_position_corner*bolt_width])(bolt_hole))
        bolt_holes.append(solid.translate([-rack_x/2+bolt_position_corner*bolt_width,rack_y/2-bolt_position_corner*bolt_width])(bolt_hole))
        bolt_holes.append(solid.translate([-rack_x/2+bolt_position_corner*bolt_width,-rack_y/2+bolt_position_corner*bolt_width])(bolt_hole))
        bolt_holes.append(solid.translate([rack_x/2-bolt_position_corner*bolt_width,-rack_y/2+bolt_position_corner*bolt_width])(bolt_hole))
        bolt_holes = solid.union()(*bolt_holes)
        rack=solid.difference()(rack,bolt_holes)
    rack_support = rack

    #center rack with pipette holes
    #rack = solid.translate([0,0,-rack_thickness])(rack)
    rack = solid.translate([X_len/2,Y_len/2])(rack)
    rack = solid.translate([-alignment_offset[0],-alignment_offset[1]])(rack)
    if not taper_angle == 0:
        wells=chamfer_extrude(pillar_height,taper_angle,segments=20)(wells)
    else:
        wells = solid.linear_extrude(height=pillar_height)(wells)
    rack = solid.union()(rack,wells)
    return rack, rack_support

def deg_taper_len(height,deg):
    if not deg == 0:
        return height*math.tan(math.radians(deg))
    else:
        return 0









 
 
************************************************/
